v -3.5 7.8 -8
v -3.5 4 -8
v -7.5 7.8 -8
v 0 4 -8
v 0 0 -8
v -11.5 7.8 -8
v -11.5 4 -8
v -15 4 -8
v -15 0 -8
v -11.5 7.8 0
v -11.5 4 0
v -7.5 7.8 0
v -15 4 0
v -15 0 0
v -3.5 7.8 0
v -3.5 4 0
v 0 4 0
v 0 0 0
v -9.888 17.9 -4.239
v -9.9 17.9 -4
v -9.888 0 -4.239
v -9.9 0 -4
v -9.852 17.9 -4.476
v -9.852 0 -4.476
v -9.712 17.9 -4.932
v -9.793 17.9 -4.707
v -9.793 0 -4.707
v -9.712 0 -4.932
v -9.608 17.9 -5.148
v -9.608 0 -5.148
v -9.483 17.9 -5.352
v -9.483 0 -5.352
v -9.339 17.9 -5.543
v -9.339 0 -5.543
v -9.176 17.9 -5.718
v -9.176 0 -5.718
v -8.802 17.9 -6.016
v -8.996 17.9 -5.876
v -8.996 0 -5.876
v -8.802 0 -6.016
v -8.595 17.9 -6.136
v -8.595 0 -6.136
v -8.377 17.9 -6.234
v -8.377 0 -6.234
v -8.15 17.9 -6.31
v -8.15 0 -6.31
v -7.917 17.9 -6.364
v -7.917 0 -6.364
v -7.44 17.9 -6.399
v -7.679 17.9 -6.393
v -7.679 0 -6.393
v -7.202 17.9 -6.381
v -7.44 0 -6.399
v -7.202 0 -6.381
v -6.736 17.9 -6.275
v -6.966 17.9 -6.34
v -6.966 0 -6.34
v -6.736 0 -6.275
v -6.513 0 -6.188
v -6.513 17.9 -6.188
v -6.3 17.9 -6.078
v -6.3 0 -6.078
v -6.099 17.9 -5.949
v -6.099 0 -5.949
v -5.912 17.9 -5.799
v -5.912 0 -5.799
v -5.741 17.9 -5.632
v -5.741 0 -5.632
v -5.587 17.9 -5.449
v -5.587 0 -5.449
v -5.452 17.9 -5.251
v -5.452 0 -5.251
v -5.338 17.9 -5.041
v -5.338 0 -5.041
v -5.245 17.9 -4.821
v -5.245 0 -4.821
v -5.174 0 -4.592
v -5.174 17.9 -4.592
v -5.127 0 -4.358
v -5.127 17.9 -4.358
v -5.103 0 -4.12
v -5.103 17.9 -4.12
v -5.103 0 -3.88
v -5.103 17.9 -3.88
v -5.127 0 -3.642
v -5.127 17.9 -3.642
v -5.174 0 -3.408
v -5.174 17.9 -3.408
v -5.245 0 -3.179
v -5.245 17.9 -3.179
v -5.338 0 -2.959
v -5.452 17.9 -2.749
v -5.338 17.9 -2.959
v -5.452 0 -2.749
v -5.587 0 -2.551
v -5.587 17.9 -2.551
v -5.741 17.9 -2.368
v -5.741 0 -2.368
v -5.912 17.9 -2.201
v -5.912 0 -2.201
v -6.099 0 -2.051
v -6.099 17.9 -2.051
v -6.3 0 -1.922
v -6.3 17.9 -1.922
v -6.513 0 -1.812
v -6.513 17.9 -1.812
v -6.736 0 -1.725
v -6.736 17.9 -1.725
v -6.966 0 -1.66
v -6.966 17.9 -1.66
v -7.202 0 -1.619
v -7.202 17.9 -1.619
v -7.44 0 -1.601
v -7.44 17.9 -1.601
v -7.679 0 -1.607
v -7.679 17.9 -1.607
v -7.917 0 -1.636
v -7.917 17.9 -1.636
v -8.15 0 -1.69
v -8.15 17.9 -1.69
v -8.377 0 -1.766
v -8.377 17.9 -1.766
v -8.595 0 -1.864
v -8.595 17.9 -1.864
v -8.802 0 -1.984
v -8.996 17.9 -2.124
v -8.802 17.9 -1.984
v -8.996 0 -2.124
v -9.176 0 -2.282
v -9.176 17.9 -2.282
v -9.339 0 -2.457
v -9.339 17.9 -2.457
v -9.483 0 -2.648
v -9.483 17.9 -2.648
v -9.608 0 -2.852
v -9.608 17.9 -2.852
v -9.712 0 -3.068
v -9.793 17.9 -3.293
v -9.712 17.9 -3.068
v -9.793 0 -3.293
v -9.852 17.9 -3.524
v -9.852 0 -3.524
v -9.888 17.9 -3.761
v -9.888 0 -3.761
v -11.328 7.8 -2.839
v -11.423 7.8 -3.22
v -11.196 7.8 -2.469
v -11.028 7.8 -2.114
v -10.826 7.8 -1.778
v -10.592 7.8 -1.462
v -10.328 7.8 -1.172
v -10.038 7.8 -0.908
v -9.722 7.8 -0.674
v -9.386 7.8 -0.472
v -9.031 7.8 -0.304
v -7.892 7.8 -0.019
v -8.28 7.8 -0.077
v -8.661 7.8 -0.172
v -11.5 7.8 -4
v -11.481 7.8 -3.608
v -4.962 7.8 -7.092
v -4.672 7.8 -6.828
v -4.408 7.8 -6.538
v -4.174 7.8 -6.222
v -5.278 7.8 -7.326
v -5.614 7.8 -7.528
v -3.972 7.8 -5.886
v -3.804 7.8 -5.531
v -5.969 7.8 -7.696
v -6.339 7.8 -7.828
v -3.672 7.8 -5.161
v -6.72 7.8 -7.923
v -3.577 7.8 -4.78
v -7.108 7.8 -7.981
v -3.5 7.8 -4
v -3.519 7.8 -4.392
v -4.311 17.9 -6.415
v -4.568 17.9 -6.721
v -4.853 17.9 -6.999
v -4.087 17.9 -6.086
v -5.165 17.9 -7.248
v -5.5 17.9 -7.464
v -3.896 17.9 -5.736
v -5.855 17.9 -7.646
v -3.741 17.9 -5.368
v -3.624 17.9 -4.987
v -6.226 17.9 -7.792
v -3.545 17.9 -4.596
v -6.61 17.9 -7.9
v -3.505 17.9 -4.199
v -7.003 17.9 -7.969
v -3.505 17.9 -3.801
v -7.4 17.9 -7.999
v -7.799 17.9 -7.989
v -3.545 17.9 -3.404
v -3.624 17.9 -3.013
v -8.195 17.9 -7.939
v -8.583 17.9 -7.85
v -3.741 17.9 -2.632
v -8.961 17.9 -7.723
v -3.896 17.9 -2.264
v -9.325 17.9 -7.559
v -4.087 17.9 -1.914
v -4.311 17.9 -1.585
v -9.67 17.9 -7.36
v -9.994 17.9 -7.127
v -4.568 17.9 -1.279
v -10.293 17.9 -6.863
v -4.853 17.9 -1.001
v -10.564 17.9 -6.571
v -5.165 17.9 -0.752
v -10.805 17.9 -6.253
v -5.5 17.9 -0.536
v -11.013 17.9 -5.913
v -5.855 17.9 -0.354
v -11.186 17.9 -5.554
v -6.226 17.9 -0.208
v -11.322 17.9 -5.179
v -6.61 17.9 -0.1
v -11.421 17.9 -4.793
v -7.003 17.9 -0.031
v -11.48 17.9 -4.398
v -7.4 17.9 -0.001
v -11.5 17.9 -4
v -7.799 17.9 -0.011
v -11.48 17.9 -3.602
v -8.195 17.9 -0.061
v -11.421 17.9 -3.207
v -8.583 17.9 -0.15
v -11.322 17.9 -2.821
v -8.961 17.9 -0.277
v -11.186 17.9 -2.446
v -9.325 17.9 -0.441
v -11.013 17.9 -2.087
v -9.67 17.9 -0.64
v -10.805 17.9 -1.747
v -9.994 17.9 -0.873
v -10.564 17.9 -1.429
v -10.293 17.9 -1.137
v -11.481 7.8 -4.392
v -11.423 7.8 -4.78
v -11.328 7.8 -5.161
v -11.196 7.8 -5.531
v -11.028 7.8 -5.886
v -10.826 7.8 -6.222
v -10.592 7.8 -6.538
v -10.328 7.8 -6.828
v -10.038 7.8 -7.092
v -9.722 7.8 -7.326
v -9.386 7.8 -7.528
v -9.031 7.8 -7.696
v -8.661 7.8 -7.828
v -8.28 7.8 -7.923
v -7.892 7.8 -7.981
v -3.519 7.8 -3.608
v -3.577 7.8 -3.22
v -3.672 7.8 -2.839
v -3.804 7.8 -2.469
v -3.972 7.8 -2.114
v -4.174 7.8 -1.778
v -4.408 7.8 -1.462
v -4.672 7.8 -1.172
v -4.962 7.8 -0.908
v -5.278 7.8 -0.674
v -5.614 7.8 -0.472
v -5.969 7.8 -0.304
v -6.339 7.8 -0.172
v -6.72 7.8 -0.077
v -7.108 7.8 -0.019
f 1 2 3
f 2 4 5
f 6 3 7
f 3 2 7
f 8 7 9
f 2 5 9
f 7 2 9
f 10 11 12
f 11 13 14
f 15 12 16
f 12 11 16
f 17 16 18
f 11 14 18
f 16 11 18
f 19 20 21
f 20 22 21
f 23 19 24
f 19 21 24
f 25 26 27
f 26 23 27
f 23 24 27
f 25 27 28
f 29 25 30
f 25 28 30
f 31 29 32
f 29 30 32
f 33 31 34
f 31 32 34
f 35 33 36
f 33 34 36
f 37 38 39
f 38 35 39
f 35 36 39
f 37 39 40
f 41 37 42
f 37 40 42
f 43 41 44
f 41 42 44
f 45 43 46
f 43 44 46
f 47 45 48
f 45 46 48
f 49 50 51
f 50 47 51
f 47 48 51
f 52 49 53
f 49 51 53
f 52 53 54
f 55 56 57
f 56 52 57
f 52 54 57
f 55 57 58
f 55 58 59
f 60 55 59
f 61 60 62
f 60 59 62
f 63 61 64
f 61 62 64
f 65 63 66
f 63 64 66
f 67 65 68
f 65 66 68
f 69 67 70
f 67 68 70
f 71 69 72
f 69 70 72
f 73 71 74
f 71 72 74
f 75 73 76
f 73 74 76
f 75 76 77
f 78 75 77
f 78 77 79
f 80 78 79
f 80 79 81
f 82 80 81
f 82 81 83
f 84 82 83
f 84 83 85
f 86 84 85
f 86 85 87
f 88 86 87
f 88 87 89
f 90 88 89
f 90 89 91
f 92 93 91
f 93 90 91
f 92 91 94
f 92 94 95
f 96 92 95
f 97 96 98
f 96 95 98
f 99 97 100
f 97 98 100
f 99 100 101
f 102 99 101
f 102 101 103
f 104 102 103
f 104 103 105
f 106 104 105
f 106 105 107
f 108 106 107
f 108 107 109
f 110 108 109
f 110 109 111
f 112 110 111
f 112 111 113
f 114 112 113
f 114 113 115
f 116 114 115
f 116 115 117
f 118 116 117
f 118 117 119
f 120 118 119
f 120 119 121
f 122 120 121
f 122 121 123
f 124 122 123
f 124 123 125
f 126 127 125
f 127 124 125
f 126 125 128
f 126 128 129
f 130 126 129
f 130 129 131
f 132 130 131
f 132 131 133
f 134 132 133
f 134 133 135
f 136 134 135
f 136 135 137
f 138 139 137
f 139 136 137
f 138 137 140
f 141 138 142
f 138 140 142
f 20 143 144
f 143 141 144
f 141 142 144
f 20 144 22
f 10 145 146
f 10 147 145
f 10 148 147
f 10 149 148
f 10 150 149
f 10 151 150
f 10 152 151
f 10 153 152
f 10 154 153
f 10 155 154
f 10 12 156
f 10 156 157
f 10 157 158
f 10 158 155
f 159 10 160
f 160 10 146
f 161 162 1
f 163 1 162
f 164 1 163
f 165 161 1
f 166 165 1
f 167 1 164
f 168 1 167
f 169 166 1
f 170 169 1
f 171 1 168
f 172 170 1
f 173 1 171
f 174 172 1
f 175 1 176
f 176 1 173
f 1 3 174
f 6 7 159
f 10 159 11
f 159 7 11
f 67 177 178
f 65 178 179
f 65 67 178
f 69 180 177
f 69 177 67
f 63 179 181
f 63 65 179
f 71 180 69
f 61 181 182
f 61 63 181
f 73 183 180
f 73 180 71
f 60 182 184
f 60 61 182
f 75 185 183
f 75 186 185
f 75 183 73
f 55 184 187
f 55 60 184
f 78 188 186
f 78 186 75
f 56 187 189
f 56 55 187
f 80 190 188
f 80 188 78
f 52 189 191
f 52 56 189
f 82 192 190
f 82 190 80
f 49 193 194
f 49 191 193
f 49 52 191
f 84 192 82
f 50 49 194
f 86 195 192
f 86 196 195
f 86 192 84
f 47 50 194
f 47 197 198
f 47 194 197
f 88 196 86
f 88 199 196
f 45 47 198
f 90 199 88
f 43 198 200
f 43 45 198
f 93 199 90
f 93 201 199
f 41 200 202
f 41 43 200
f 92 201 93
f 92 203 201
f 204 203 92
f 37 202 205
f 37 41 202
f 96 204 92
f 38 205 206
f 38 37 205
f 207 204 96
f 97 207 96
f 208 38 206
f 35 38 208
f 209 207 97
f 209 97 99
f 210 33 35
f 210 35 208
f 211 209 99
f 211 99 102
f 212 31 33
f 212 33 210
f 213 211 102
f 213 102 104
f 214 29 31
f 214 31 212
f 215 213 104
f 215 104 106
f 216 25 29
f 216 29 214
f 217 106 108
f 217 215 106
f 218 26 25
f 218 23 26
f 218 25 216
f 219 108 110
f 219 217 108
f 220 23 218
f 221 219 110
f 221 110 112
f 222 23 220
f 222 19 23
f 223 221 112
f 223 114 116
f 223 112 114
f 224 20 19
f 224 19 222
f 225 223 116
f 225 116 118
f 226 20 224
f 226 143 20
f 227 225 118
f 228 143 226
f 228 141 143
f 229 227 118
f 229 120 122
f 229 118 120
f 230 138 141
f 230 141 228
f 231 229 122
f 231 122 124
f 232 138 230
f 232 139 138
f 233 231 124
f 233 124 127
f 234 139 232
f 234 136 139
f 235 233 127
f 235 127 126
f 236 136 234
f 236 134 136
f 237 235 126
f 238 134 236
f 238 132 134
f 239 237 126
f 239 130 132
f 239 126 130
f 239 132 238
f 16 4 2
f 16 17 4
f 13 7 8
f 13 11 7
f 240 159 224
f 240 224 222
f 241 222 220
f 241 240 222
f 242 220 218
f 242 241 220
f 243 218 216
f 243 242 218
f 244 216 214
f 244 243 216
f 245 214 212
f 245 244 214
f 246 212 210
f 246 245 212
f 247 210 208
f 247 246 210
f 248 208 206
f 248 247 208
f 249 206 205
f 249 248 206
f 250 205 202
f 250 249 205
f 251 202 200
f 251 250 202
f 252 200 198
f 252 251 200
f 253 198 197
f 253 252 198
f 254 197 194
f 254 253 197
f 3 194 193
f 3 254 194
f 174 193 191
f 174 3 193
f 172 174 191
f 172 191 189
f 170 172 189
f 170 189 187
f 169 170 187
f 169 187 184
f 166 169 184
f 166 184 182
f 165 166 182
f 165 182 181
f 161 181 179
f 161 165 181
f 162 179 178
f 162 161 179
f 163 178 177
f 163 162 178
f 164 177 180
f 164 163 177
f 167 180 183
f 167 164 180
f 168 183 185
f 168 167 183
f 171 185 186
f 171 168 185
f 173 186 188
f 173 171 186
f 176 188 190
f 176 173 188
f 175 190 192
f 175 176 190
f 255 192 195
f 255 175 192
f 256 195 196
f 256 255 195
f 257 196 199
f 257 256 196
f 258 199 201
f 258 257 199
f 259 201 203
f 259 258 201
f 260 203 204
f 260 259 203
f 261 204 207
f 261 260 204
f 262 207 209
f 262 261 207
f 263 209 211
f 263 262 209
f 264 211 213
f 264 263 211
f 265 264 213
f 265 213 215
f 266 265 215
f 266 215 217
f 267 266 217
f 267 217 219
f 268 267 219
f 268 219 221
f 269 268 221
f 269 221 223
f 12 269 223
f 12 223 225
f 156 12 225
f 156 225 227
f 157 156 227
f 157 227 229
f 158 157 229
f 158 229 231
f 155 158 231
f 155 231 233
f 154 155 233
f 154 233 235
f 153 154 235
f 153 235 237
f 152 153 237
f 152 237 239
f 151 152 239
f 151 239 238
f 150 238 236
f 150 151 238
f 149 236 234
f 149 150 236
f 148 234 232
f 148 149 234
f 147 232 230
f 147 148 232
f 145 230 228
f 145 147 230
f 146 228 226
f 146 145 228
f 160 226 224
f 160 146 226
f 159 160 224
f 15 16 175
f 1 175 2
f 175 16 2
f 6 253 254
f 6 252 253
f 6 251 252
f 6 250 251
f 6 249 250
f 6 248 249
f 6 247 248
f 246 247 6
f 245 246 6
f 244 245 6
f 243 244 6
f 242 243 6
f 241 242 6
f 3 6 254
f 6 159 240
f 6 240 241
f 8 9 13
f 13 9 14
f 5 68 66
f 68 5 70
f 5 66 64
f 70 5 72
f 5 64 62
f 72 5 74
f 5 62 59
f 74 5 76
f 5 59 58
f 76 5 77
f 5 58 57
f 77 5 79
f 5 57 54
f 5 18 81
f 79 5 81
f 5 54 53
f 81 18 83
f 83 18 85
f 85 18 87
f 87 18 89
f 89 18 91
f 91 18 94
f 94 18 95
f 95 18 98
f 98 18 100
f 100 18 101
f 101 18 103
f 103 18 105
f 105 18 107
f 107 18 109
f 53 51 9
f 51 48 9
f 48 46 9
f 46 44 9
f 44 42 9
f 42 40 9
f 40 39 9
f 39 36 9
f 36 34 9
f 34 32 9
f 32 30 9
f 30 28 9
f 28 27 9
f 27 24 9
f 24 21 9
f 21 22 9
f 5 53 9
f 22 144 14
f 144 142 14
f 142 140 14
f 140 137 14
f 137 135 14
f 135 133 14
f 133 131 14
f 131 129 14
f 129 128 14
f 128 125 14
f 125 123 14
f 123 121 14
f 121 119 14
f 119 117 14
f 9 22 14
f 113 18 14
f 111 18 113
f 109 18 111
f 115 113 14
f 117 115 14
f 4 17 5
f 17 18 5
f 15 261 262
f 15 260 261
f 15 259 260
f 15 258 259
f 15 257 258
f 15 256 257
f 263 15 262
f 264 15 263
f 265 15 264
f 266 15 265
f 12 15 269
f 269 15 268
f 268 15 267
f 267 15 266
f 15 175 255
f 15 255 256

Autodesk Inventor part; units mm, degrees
ref_plane "YZ Plane" through (0, 0, 0) normal (1, 0, 0) x (0, 1, 0)
ref_plane "XZ Plane" through (0, 0, 0) normal (0, 1, 0) x (-1, 0, 0)
ref_plane "XY Plane" through (0, 0, 0) normal (0, 0, 1) x (1, 0, 0)
sketch "Sketch1" plane through (0, 0, 0) normal (0, 1, 0) x (-1, 0, 0)
  line L0 (0, -8) -> (15, -8)
  line L1 (15, -8) -> (15, 0)
  line L2 (15, 0) -> (0, 0)
  line L3 (0, 0) -> (0, -8)
  line L4 (7.5, 0) -> (7.5, -8) construction
  line L5 (0, -4) -> (15, -4) construction
  line L6 (3.5, 0) -> (3.5, -8)
  line L7 (11.5, -8) -> (11.5, 0)
  circle A0 centre (7.5, -4) radius 2.4
  circle A1 centre (7.5, -4) radius 4
  dimension "d2" = 15
  dimension "d3" = 8
  dimension "d4" = 4
  dimension "d5" = 4
  dimension "d6" = 4.8
  dimension "d7" = 8
extrude "Extrusion1" add sketch "Sketch1" along normal blind 4 contours L3 L2 L6 L0 | L7 L2 L1 L0
extrude "Extrusion2" add sketch "Sketch1" along normal blind 7.8 contours L6 A1 L0 | A1 L7 L0 | A1 | L6 L2 A1 | A1 L2 L7
extrude "Extrusion3" add sketch "Sketch1" along normal blind 10.1 from surface at 7.8 contours A1
equation "\"d4\" = 0.5 * d3"
equation "\"d5\" = 0.5 * d3"
properties part number "diff_gear_holder_3"
